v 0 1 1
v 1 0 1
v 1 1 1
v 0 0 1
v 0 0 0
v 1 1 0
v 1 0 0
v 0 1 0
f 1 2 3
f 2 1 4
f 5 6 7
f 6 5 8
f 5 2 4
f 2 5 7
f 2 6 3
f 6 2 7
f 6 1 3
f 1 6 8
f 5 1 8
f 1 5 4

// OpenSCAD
cube(1);
echo(1 != 1);
echo(1 != 2);
echo(1 != "1");
echo(1 != "2");
echo("1" != 1);
echo("1" != 2);
echo("12" != "12");

echo(1 != true);
echo(0 != true);
echo("a" != true);

echo(true != 1);
echo(true != 0);
echo(true != "a");

echo(true != true);
echo(true != false);
echo(false != true);

echo([1] != [1]);
echo([1,2] != [1,2]);
echo([1,[2,3]] != [1,[2,3]]);
echo([1] != [2]);
echo([1,[2,3]] != [1,[2,4]]);


echo(1 != [1]);
echo(true != [1]);
echo("1" != [1]);

echo([1] != 1);
echo([1] != true);
echo([1] != "1");
